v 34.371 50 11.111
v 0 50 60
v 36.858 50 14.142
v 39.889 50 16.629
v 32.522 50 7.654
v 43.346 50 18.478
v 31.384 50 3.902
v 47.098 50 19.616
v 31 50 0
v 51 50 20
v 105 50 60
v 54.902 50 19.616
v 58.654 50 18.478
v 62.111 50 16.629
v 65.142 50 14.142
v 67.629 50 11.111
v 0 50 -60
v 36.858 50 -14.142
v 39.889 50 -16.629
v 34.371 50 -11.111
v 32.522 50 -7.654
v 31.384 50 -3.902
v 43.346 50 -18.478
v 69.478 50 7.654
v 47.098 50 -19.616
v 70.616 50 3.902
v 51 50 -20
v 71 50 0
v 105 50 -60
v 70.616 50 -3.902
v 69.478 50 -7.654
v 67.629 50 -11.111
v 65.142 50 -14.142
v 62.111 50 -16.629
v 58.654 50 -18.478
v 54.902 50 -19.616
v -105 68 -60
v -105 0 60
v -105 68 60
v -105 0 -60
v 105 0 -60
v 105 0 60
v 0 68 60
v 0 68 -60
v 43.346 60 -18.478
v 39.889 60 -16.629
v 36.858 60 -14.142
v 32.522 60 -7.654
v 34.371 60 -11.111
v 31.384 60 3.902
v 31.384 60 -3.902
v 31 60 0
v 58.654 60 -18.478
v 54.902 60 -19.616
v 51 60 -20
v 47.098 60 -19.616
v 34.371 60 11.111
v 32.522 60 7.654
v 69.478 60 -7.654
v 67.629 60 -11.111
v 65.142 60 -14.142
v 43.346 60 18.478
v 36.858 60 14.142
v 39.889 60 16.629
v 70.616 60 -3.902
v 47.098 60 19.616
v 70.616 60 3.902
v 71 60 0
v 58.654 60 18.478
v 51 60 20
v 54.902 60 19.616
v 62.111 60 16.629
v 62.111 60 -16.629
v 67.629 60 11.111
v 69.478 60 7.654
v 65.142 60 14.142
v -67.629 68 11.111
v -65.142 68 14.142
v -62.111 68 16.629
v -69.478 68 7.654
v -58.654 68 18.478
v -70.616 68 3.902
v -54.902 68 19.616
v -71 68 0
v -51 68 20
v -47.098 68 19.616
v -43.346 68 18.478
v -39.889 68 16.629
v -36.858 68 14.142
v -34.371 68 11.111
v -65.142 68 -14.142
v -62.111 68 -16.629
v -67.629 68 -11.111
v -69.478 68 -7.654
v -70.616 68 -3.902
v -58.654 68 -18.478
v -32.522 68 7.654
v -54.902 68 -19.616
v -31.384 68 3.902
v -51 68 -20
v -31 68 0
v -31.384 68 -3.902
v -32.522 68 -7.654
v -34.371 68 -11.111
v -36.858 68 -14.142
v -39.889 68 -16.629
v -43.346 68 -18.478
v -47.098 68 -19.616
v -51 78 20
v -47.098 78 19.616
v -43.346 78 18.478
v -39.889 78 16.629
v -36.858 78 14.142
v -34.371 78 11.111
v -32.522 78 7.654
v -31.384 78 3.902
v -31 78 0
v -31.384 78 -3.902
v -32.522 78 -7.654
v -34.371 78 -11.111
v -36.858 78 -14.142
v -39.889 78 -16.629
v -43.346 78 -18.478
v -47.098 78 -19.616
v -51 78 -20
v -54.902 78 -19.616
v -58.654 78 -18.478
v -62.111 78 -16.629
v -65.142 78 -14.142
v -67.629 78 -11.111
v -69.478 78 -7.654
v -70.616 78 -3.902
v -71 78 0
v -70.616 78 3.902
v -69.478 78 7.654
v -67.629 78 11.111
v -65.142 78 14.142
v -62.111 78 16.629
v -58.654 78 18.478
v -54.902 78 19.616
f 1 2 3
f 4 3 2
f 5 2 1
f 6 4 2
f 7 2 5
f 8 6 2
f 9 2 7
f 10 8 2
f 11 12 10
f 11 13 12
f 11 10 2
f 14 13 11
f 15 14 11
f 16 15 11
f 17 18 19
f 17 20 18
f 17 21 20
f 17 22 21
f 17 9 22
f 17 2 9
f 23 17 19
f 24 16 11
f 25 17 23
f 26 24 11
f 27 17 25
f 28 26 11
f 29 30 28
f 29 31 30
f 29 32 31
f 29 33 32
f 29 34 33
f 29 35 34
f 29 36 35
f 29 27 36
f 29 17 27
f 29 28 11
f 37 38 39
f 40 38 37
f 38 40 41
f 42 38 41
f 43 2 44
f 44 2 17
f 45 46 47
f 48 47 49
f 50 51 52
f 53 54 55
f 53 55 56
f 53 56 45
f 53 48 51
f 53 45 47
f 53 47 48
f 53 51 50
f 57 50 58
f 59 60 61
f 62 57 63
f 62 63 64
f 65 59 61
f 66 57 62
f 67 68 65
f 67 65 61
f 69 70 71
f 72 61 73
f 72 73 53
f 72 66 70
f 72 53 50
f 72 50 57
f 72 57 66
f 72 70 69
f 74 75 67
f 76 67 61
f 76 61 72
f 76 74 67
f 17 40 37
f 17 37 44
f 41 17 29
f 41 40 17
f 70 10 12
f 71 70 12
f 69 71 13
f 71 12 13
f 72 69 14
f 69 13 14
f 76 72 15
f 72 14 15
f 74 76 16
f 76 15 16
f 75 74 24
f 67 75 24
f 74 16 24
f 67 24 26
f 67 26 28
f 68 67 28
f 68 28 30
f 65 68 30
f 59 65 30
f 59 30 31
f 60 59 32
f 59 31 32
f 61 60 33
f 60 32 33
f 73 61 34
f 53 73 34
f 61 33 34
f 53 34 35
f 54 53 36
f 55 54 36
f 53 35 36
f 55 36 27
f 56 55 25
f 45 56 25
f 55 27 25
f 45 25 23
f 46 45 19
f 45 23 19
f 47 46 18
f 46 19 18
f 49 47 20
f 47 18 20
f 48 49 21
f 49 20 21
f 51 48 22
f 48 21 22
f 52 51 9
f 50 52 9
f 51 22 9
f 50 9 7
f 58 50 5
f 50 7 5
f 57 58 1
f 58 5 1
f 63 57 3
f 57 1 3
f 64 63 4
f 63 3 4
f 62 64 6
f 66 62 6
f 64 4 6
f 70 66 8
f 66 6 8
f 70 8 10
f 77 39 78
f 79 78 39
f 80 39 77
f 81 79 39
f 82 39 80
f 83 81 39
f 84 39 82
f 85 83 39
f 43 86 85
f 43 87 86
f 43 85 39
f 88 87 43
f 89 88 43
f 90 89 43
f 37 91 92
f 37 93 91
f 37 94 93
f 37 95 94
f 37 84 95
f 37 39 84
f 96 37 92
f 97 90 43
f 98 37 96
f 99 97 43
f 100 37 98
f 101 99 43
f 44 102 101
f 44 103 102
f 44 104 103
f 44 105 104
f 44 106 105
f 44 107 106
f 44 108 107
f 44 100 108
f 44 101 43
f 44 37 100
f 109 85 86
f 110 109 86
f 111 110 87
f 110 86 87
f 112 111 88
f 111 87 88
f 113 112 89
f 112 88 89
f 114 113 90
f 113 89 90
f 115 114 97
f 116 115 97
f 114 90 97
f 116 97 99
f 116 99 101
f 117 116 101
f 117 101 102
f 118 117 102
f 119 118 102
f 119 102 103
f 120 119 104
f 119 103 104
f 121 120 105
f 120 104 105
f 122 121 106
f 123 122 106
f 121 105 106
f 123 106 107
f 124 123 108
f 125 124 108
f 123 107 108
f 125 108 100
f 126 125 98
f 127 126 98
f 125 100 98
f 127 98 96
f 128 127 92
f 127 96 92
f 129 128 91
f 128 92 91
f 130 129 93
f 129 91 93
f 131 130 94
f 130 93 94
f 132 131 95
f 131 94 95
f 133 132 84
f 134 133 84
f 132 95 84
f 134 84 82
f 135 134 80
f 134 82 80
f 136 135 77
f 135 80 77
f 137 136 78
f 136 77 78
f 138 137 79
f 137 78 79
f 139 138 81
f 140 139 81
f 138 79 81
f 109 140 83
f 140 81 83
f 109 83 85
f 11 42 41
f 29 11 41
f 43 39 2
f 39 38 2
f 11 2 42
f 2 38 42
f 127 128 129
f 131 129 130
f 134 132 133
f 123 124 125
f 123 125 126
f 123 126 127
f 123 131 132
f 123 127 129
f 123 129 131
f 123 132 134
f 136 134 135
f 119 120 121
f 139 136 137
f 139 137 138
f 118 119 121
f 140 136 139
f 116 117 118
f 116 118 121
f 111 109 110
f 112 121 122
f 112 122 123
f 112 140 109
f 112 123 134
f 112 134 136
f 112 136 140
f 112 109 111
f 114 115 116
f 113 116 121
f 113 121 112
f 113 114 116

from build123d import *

# Parameters (mm, degrees)
SKETCH1_W           = 210
SKETCH1_H           = 120
BOSS_EXTRUDE1_DEPTH = 50
SKETCH2_W           = 105
SKETCH2_H           = 120
BOSS_EXTRUDE2_DEPTH = 18
SKETCH3_R           = 20
BOSS_EXTRUDE3_DEPTH = 10
SKETCH4_R           = 20
BOSS_EXTRUDE4_DEPTH = 10


with BuildPart() as part:
    # Sketch1 → Boss-Extrude1 (new body)
    with BuildSketch(Plane(origin=(0, 0, 0), x_dir=(1, 0, 0), z_dir=(0, 1, 0))):
        Rectangle(SKETCH1_W, SKETCH1_H)
    extrude(amount=BOSS_EXTRUDE1_DEPTH)

    # Sketch2 → Boss-Extrude2 (add)
    with BuildSketch(Plane(origin=(0, 50, 0), x_dir=(1, 0, 0), z_dir=(0, 1, 0))):
        with Locations((-52.5, 0)):
            Rectangle(SKETCH2_W, SKETCH2_H)
    extrude(amount=BOSS_EXTRUDE2_DEPTH)

    # Sketch3 → Boss-Extrude3 (add)
    with BuildSketch(Plane(origin=(0, 68, 0), x_dir=(1, 0, 0), z_dir=(0, 1, 0))):
        with Locations(Location((-51, 0, 0), (0, 0, 270))):
            Circle(SKETCH3_R)
    extrude(amount=BOSS_EXTRUDE3_DEPTH)

    # Sketch4 → Boss-Extrude4 (add)
    with BuildSketch(Plane(origin=(0, 50, 0), x_dir=(1, 0, 0), z_dir=(0, 1, 0))):
        with Locations(Location((51, 0, 0), (0, 0, 270))):
            Circle(SKETCH4_R)
    extrude(amount=BOSS_EXTRUDE4_DEPTH)


solid = part.part
